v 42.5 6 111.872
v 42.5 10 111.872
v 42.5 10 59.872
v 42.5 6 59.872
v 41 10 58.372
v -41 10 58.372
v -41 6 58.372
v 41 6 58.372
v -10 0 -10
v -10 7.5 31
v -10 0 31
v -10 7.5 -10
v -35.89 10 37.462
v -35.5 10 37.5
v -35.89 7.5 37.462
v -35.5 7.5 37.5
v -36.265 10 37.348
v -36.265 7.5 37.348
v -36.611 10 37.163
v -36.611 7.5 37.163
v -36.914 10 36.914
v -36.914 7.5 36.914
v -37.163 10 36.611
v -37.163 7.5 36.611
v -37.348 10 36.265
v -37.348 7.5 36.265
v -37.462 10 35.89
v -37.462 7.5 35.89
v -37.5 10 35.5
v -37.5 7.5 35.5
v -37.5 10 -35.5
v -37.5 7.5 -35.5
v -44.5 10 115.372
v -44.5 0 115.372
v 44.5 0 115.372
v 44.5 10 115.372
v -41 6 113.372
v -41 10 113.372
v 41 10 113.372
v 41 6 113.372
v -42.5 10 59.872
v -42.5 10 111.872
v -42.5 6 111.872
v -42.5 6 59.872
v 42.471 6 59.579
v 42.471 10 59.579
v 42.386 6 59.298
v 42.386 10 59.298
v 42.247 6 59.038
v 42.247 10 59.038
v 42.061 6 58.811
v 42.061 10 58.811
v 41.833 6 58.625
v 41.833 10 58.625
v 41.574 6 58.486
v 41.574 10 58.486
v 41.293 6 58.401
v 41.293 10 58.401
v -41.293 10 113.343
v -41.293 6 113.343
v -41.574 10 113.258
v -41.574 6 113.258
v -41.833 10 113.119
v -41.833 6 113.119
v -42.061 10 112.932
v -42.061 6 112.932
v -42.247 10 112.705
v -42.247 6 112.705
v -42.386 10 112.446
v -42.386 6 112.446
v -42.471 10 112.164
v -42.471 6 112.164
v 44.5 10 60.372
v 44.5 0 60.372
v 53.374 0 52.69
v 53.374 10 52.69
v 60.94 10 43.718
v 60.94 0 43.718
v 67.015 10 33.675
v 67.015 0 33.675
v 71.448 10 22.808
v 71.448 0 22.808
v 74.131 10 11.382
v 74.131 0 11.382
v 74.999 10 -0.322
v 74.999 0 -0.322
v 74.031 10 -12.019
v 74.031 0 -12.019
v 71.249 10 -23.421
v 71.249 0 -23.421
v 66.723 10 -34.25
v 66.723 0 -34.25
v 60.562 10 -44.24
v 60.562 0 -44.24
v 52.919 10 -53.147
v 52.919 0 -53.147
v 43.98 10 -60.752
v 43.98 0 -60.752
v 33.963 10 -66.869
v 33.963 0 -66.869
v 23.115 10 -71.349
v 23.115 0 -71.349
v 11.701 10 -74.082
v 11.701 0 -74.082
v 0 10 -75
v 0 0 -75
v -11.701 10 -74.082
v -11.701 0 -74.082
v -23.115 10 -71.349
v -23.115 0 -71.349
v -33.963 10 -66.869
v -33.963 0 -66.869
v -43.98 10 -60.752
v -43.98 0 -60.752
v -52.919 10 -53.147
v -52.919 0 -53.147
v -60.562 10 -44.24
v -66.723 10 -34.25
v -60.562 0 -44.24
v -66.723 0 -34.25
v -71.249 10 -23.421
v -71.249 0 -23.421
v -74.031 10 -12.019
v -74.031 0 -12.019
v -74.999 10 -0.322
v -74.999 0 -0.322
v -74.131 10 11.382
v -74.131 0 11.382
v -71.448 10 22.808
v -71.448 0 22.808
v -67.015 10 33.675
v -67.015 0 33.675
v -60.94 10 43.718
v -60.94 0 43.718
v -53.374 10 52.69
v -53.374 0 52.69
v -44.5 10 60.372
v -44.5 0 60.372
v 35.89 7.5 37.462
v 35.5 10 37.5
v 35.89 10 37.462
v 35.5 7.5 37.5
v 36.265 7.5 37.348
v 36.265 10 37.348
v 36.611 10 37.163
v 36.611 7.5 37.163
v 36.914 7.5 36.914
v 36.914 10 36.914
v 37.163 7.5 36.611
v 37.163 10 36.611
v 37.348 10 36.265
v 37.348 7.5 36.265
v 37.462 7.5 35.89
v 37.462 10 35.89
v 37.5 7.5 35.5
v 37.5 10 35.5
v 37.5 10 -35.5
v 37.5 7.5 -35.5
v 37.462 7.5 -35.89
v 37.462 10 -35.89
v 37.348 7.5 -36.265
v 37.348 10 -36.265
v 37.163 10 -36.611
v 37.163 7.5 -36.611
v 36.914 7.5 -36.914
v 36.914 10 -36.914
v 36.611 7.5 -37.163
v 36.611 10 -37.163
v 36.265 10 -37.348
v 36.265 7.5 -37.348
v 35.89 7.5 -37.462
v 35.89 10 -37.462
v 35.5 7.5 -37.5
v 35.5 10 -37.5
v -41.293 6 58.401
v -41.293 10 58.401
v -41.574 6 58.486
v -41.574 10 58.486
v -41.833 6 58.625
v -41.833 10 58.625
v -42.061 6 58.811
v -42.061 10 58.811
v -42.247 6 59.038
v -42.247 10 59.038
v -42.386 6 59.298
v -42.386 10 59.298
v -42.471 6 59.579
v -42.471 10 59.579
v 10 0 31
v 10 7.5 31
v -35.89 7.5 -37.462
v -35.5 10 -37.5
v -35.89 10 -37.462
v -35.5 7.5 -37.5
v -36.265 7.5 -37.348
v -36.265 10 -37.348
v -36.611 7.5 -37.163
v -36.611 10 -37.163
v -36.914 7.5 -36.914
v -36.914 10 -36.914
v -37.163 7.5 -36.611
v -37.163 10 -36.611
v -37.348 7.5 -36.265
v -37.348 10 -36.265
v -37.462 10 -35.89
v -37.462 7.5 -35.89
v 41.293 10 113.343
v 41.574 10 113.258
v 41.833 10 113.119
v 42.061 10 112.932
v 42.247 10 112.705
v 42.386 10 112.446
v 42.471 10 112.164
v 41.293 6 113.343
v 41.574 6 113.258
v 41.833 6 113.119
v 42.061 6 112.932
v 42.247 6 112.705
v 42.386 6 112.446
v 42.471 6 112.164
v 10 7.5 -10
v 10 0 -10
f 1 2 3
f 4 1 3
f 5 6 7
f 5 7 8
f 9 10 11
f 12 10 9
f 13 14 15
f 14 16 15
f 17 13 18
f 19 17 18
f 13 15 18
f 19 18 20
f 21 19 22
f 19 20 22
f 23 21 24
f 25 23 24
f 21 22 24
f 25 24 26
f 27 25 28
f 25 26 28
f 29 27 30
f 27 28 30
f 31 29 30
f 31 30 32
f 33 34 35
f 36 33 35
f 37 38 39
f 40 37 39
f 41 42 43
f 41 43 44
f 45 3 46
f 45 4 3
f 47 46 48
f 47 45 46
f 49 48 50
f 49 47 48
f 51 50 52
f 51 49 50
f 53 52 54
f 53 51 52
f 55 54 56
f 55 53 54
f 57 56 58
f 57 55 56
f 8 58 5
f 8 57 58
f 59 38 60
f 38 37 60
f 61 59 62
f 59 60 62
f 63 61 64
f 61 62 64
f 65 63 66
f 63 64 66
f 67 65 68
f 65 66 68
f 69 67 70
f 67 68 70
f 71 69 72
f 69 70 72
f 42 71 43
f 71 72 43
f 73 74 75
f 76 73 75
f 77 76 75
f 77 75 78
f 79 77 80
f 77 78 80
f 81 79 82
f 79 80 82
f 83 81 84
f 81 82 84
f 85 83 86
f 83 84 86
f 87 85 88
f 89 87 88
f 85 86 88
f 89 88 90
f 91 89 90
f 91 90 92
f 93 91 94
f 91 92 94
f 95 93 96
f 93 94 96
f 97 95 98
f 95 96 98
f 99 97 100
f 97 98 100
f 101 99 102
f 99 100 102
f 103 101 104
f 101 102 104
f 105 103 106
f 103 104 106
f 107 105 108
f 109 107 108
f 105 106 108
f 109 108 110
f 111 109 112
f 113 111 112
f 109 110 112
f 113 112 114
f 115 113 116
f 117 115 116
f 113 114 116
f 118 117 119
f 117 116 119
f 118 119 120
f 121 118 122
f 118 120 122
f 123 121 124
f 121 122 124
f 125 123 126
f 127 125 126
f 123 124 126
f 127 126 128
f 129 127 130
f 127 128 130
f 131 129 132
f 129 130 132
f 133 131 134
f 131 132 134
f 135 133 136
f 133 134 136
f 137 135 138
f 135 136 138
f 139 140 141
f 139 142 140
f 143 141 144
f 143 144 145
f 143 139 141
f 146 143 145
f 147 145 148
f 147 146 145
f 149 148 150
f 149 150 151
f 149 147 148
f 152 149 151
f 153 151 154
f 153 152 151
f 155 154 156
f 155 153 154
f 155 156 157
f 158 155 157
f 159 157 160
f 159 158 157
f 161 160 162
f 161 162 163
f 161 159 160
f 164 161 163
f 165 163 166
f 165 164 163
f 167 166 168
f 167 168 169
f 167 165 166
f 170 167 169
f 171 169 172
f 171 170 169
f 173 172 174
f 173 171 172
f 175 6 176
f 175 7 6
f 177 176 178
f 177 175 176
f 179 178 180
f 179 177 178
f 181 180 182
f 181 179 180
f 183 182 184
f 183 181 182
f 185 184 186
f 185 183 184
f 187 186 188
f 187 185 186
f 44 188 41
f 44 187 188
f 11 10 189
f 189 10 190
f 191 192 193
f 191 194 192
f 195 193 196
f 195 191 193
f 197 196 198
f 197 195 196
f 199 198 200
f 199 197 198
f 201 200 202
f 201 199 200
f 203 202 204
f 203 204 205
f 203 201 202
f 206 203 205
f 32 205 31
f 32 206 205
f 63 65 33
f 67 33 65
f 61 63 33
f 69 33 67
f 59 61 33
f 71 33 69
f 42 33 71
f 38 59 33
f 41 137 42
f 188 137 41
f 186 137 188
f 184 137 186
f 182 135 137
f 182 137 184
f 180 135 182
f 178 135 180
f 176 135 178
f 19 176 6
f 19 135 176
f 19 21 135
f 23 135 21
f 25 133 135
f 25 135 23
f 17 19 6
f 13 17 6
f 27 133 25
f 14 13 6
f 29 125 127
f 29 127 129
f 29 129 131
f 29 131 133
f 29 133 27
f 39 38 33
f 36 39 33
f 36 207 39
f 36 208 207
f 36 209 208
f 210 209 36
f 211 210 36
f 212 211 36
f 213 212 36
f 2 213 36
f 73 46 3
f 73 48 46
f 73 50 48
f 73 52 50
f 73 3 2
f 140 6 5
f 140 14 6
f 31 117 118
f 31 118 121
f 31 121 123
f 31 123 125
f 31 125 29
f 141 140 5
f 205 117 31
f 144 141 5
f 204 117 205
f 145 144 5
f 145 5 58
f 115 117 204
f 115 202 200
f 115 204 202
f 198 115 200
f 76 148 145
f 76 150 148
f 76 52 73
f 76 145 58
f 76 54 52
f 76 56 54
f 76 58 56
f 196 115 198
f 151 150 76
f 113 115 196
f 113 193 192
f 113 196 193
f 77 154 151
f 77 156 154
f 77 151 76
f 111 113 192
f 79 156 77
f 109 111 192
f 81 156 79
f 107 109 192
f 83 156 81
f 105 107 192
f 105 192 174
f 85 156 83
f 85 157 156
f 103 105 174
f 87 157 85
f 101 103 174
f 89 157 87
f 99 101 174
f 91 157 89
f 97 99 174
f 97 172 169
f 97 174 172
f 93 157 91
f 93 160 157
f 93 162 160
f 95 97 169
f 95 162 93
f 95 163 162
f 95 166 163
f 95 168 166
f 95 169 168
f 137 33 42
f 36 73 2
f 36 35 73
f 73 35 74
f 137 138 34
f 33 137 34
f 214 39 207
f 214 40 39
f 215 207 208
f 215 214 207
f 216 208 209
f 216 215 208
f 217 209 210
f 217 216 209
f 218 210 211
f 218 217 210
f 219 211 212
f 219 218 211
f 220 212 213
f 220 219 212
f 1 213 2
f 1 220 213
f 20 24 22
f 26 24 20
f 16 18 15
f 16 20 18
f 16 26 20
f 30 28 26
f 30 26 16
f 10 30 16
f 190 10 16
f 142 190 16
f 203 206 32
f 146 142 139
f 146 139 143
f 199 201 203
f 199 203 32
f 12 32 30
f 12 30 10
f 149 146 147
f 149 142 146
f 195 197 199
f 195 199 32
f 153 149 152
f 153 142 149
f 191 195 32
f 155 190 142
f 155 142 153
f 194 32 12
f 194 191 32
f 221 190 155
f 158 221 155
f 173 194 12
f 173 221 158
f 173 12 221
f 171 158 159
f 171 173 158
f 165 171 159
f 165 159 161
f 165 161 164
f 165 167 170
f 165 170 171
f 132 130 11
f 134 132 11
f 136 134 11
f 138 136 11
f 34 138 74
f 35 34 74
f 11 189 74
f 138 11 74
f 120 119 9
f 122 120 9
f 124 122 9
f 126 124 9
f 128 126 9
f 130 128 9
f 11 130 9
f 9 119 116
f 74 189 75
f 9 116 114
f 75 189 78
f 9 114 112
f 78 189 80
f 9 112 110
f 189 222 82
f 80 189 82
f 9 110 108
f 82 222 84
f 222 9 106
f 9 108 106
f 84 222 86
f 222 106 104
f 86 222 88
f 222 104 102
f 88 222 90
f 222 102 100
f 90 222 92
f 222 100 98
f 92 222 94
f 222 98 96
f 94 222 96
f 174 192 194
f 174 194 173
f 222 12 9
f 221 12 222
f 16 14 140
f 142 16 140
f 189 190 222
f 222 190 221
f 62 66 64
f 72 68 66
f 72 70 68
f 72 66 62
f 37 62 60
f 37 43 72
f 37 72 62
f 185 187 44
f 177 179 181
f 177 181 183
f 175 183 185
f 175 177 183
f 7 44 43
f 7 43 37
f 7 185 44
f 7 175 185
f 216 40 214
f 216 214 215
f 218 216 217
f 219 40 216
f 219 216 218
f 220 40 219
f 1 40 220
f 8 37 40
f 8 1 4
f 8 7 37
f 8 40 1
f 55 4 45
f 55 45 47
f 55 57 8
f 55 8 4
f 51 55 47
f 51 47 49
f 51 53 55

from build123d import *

# Parameters (mm, degrees)
BOSS_EXTRUDE2_DEPTH = 10
CUT_EXTRUDE2_START  = 10
SKETCH3_W           = 75
SKETCH3_H           = 75
CUT_EXTRUDE2_DEPTH  = 2.5
FILLET2_R           = 2
CUT_EXTRUDE3_START  = 10
SKETCH5_W           = 85
SKETCH5_H           = 55
CUT_EXTRUDE3_DEPTH  = 4
FILLET3_R           = 1.5
CUT_EXTRUDE4_START  = 7.5
SKETCH6_W           = 20
SKETCH6_H           = 41
CUT_EXTRUDE4_DEPTH  = 45


with BuildPart() as part:
    # Sketch2 → Boss-Extrude2 (new body)
    with BuildSketch(Plane(origin=(0, 0, 0), x_dir=(1, 0, 0), z_dir=(0, 1, 0))):
        with BuildLine():
            Line((-44.5, -60.371764924), (-44.5, -115.371764924))
            Line((-44.5, -115.371764924), (44.5, -115.371764924))
            Line((44.5, -115.371764924), (44.5, -60.371764924))
            ThreePointArc((44.5, -60.371764924), (0, 75), (-44.5, -60.371764924))
        make_face()
    extrude(amount=BOSS_EXTRUDE2_DEPTH)

    # Sketch3 → Cut-Extrude2 (cut)
    with BuildSketch(Plane(origin=(0, 0, 0), x_dir=(1, 0, 0), z_dir=(0, 1, 0)).offset(CUT_EXTRUDE2_START)):
        Rectangle(SKETCH3_W, SKETCH3_H)
    extrude(amount=-CUT_EXTRUDE2_DEPTH, mode=Mode.SUBTRACT)

    # Fillet2
    fillet2_edges = [part.edges().sort_by_distance(p)[0] for p in [
        (37.5, 8.75, -37.5),
        (37.5, 8.75, 37.5),
        (-37.5, 8.75, 37.5),
        (-37.5, 8.75, -37.5),
    ]]
    fillet(fillet2_edges, radius=FILLET2_R)

    # Sketch5 → Cut-Extrude3 (cut)
    with BuildSketch(Plane(origin=(0, 0, 0), x_dir=(1, 0, 0), z_dir=(0, 1, 0)).offset(CUT_EXTRUDE3_START)):
        with Locations((0, -85.871764924)):
            Rectangle(SKETCH5_W, SKETCH5_H)
    extrude(amount=-CUT_EXTRUDE3_DEPTH, mode=Mode.SUBTRACT)

    # Fillet3
    fillet3_edges = [part.edges().sort_by_distance(p)[0] for p in [
        (42.5, 8, 113.371764924),
        (-42.5, 8, 113.371764924),
        (-42.5, 8, 58.371764924),
        (42.5, 8, 58.371764924),
    ]]
    fillet(fillet3_edges, radius=FILLET3_R)

    # Sketch6 → Cut-Extrude4 (cut)
    with BuildSketch(Plane(origin=(0, 0, 0), x_dir=(1, 0, 0), z_dir=(0, 1, 0)).offset(CUT_EXTRUDE4_START)):
        with Locations((0, -10.5)):
            Rectangle(SKETCH6_W, SKETCH6_H)
    extrude(amount=-CUT_EXTRUDE4_DEPTH, mode=Mode.SUBTRACT)


solid = part.part
